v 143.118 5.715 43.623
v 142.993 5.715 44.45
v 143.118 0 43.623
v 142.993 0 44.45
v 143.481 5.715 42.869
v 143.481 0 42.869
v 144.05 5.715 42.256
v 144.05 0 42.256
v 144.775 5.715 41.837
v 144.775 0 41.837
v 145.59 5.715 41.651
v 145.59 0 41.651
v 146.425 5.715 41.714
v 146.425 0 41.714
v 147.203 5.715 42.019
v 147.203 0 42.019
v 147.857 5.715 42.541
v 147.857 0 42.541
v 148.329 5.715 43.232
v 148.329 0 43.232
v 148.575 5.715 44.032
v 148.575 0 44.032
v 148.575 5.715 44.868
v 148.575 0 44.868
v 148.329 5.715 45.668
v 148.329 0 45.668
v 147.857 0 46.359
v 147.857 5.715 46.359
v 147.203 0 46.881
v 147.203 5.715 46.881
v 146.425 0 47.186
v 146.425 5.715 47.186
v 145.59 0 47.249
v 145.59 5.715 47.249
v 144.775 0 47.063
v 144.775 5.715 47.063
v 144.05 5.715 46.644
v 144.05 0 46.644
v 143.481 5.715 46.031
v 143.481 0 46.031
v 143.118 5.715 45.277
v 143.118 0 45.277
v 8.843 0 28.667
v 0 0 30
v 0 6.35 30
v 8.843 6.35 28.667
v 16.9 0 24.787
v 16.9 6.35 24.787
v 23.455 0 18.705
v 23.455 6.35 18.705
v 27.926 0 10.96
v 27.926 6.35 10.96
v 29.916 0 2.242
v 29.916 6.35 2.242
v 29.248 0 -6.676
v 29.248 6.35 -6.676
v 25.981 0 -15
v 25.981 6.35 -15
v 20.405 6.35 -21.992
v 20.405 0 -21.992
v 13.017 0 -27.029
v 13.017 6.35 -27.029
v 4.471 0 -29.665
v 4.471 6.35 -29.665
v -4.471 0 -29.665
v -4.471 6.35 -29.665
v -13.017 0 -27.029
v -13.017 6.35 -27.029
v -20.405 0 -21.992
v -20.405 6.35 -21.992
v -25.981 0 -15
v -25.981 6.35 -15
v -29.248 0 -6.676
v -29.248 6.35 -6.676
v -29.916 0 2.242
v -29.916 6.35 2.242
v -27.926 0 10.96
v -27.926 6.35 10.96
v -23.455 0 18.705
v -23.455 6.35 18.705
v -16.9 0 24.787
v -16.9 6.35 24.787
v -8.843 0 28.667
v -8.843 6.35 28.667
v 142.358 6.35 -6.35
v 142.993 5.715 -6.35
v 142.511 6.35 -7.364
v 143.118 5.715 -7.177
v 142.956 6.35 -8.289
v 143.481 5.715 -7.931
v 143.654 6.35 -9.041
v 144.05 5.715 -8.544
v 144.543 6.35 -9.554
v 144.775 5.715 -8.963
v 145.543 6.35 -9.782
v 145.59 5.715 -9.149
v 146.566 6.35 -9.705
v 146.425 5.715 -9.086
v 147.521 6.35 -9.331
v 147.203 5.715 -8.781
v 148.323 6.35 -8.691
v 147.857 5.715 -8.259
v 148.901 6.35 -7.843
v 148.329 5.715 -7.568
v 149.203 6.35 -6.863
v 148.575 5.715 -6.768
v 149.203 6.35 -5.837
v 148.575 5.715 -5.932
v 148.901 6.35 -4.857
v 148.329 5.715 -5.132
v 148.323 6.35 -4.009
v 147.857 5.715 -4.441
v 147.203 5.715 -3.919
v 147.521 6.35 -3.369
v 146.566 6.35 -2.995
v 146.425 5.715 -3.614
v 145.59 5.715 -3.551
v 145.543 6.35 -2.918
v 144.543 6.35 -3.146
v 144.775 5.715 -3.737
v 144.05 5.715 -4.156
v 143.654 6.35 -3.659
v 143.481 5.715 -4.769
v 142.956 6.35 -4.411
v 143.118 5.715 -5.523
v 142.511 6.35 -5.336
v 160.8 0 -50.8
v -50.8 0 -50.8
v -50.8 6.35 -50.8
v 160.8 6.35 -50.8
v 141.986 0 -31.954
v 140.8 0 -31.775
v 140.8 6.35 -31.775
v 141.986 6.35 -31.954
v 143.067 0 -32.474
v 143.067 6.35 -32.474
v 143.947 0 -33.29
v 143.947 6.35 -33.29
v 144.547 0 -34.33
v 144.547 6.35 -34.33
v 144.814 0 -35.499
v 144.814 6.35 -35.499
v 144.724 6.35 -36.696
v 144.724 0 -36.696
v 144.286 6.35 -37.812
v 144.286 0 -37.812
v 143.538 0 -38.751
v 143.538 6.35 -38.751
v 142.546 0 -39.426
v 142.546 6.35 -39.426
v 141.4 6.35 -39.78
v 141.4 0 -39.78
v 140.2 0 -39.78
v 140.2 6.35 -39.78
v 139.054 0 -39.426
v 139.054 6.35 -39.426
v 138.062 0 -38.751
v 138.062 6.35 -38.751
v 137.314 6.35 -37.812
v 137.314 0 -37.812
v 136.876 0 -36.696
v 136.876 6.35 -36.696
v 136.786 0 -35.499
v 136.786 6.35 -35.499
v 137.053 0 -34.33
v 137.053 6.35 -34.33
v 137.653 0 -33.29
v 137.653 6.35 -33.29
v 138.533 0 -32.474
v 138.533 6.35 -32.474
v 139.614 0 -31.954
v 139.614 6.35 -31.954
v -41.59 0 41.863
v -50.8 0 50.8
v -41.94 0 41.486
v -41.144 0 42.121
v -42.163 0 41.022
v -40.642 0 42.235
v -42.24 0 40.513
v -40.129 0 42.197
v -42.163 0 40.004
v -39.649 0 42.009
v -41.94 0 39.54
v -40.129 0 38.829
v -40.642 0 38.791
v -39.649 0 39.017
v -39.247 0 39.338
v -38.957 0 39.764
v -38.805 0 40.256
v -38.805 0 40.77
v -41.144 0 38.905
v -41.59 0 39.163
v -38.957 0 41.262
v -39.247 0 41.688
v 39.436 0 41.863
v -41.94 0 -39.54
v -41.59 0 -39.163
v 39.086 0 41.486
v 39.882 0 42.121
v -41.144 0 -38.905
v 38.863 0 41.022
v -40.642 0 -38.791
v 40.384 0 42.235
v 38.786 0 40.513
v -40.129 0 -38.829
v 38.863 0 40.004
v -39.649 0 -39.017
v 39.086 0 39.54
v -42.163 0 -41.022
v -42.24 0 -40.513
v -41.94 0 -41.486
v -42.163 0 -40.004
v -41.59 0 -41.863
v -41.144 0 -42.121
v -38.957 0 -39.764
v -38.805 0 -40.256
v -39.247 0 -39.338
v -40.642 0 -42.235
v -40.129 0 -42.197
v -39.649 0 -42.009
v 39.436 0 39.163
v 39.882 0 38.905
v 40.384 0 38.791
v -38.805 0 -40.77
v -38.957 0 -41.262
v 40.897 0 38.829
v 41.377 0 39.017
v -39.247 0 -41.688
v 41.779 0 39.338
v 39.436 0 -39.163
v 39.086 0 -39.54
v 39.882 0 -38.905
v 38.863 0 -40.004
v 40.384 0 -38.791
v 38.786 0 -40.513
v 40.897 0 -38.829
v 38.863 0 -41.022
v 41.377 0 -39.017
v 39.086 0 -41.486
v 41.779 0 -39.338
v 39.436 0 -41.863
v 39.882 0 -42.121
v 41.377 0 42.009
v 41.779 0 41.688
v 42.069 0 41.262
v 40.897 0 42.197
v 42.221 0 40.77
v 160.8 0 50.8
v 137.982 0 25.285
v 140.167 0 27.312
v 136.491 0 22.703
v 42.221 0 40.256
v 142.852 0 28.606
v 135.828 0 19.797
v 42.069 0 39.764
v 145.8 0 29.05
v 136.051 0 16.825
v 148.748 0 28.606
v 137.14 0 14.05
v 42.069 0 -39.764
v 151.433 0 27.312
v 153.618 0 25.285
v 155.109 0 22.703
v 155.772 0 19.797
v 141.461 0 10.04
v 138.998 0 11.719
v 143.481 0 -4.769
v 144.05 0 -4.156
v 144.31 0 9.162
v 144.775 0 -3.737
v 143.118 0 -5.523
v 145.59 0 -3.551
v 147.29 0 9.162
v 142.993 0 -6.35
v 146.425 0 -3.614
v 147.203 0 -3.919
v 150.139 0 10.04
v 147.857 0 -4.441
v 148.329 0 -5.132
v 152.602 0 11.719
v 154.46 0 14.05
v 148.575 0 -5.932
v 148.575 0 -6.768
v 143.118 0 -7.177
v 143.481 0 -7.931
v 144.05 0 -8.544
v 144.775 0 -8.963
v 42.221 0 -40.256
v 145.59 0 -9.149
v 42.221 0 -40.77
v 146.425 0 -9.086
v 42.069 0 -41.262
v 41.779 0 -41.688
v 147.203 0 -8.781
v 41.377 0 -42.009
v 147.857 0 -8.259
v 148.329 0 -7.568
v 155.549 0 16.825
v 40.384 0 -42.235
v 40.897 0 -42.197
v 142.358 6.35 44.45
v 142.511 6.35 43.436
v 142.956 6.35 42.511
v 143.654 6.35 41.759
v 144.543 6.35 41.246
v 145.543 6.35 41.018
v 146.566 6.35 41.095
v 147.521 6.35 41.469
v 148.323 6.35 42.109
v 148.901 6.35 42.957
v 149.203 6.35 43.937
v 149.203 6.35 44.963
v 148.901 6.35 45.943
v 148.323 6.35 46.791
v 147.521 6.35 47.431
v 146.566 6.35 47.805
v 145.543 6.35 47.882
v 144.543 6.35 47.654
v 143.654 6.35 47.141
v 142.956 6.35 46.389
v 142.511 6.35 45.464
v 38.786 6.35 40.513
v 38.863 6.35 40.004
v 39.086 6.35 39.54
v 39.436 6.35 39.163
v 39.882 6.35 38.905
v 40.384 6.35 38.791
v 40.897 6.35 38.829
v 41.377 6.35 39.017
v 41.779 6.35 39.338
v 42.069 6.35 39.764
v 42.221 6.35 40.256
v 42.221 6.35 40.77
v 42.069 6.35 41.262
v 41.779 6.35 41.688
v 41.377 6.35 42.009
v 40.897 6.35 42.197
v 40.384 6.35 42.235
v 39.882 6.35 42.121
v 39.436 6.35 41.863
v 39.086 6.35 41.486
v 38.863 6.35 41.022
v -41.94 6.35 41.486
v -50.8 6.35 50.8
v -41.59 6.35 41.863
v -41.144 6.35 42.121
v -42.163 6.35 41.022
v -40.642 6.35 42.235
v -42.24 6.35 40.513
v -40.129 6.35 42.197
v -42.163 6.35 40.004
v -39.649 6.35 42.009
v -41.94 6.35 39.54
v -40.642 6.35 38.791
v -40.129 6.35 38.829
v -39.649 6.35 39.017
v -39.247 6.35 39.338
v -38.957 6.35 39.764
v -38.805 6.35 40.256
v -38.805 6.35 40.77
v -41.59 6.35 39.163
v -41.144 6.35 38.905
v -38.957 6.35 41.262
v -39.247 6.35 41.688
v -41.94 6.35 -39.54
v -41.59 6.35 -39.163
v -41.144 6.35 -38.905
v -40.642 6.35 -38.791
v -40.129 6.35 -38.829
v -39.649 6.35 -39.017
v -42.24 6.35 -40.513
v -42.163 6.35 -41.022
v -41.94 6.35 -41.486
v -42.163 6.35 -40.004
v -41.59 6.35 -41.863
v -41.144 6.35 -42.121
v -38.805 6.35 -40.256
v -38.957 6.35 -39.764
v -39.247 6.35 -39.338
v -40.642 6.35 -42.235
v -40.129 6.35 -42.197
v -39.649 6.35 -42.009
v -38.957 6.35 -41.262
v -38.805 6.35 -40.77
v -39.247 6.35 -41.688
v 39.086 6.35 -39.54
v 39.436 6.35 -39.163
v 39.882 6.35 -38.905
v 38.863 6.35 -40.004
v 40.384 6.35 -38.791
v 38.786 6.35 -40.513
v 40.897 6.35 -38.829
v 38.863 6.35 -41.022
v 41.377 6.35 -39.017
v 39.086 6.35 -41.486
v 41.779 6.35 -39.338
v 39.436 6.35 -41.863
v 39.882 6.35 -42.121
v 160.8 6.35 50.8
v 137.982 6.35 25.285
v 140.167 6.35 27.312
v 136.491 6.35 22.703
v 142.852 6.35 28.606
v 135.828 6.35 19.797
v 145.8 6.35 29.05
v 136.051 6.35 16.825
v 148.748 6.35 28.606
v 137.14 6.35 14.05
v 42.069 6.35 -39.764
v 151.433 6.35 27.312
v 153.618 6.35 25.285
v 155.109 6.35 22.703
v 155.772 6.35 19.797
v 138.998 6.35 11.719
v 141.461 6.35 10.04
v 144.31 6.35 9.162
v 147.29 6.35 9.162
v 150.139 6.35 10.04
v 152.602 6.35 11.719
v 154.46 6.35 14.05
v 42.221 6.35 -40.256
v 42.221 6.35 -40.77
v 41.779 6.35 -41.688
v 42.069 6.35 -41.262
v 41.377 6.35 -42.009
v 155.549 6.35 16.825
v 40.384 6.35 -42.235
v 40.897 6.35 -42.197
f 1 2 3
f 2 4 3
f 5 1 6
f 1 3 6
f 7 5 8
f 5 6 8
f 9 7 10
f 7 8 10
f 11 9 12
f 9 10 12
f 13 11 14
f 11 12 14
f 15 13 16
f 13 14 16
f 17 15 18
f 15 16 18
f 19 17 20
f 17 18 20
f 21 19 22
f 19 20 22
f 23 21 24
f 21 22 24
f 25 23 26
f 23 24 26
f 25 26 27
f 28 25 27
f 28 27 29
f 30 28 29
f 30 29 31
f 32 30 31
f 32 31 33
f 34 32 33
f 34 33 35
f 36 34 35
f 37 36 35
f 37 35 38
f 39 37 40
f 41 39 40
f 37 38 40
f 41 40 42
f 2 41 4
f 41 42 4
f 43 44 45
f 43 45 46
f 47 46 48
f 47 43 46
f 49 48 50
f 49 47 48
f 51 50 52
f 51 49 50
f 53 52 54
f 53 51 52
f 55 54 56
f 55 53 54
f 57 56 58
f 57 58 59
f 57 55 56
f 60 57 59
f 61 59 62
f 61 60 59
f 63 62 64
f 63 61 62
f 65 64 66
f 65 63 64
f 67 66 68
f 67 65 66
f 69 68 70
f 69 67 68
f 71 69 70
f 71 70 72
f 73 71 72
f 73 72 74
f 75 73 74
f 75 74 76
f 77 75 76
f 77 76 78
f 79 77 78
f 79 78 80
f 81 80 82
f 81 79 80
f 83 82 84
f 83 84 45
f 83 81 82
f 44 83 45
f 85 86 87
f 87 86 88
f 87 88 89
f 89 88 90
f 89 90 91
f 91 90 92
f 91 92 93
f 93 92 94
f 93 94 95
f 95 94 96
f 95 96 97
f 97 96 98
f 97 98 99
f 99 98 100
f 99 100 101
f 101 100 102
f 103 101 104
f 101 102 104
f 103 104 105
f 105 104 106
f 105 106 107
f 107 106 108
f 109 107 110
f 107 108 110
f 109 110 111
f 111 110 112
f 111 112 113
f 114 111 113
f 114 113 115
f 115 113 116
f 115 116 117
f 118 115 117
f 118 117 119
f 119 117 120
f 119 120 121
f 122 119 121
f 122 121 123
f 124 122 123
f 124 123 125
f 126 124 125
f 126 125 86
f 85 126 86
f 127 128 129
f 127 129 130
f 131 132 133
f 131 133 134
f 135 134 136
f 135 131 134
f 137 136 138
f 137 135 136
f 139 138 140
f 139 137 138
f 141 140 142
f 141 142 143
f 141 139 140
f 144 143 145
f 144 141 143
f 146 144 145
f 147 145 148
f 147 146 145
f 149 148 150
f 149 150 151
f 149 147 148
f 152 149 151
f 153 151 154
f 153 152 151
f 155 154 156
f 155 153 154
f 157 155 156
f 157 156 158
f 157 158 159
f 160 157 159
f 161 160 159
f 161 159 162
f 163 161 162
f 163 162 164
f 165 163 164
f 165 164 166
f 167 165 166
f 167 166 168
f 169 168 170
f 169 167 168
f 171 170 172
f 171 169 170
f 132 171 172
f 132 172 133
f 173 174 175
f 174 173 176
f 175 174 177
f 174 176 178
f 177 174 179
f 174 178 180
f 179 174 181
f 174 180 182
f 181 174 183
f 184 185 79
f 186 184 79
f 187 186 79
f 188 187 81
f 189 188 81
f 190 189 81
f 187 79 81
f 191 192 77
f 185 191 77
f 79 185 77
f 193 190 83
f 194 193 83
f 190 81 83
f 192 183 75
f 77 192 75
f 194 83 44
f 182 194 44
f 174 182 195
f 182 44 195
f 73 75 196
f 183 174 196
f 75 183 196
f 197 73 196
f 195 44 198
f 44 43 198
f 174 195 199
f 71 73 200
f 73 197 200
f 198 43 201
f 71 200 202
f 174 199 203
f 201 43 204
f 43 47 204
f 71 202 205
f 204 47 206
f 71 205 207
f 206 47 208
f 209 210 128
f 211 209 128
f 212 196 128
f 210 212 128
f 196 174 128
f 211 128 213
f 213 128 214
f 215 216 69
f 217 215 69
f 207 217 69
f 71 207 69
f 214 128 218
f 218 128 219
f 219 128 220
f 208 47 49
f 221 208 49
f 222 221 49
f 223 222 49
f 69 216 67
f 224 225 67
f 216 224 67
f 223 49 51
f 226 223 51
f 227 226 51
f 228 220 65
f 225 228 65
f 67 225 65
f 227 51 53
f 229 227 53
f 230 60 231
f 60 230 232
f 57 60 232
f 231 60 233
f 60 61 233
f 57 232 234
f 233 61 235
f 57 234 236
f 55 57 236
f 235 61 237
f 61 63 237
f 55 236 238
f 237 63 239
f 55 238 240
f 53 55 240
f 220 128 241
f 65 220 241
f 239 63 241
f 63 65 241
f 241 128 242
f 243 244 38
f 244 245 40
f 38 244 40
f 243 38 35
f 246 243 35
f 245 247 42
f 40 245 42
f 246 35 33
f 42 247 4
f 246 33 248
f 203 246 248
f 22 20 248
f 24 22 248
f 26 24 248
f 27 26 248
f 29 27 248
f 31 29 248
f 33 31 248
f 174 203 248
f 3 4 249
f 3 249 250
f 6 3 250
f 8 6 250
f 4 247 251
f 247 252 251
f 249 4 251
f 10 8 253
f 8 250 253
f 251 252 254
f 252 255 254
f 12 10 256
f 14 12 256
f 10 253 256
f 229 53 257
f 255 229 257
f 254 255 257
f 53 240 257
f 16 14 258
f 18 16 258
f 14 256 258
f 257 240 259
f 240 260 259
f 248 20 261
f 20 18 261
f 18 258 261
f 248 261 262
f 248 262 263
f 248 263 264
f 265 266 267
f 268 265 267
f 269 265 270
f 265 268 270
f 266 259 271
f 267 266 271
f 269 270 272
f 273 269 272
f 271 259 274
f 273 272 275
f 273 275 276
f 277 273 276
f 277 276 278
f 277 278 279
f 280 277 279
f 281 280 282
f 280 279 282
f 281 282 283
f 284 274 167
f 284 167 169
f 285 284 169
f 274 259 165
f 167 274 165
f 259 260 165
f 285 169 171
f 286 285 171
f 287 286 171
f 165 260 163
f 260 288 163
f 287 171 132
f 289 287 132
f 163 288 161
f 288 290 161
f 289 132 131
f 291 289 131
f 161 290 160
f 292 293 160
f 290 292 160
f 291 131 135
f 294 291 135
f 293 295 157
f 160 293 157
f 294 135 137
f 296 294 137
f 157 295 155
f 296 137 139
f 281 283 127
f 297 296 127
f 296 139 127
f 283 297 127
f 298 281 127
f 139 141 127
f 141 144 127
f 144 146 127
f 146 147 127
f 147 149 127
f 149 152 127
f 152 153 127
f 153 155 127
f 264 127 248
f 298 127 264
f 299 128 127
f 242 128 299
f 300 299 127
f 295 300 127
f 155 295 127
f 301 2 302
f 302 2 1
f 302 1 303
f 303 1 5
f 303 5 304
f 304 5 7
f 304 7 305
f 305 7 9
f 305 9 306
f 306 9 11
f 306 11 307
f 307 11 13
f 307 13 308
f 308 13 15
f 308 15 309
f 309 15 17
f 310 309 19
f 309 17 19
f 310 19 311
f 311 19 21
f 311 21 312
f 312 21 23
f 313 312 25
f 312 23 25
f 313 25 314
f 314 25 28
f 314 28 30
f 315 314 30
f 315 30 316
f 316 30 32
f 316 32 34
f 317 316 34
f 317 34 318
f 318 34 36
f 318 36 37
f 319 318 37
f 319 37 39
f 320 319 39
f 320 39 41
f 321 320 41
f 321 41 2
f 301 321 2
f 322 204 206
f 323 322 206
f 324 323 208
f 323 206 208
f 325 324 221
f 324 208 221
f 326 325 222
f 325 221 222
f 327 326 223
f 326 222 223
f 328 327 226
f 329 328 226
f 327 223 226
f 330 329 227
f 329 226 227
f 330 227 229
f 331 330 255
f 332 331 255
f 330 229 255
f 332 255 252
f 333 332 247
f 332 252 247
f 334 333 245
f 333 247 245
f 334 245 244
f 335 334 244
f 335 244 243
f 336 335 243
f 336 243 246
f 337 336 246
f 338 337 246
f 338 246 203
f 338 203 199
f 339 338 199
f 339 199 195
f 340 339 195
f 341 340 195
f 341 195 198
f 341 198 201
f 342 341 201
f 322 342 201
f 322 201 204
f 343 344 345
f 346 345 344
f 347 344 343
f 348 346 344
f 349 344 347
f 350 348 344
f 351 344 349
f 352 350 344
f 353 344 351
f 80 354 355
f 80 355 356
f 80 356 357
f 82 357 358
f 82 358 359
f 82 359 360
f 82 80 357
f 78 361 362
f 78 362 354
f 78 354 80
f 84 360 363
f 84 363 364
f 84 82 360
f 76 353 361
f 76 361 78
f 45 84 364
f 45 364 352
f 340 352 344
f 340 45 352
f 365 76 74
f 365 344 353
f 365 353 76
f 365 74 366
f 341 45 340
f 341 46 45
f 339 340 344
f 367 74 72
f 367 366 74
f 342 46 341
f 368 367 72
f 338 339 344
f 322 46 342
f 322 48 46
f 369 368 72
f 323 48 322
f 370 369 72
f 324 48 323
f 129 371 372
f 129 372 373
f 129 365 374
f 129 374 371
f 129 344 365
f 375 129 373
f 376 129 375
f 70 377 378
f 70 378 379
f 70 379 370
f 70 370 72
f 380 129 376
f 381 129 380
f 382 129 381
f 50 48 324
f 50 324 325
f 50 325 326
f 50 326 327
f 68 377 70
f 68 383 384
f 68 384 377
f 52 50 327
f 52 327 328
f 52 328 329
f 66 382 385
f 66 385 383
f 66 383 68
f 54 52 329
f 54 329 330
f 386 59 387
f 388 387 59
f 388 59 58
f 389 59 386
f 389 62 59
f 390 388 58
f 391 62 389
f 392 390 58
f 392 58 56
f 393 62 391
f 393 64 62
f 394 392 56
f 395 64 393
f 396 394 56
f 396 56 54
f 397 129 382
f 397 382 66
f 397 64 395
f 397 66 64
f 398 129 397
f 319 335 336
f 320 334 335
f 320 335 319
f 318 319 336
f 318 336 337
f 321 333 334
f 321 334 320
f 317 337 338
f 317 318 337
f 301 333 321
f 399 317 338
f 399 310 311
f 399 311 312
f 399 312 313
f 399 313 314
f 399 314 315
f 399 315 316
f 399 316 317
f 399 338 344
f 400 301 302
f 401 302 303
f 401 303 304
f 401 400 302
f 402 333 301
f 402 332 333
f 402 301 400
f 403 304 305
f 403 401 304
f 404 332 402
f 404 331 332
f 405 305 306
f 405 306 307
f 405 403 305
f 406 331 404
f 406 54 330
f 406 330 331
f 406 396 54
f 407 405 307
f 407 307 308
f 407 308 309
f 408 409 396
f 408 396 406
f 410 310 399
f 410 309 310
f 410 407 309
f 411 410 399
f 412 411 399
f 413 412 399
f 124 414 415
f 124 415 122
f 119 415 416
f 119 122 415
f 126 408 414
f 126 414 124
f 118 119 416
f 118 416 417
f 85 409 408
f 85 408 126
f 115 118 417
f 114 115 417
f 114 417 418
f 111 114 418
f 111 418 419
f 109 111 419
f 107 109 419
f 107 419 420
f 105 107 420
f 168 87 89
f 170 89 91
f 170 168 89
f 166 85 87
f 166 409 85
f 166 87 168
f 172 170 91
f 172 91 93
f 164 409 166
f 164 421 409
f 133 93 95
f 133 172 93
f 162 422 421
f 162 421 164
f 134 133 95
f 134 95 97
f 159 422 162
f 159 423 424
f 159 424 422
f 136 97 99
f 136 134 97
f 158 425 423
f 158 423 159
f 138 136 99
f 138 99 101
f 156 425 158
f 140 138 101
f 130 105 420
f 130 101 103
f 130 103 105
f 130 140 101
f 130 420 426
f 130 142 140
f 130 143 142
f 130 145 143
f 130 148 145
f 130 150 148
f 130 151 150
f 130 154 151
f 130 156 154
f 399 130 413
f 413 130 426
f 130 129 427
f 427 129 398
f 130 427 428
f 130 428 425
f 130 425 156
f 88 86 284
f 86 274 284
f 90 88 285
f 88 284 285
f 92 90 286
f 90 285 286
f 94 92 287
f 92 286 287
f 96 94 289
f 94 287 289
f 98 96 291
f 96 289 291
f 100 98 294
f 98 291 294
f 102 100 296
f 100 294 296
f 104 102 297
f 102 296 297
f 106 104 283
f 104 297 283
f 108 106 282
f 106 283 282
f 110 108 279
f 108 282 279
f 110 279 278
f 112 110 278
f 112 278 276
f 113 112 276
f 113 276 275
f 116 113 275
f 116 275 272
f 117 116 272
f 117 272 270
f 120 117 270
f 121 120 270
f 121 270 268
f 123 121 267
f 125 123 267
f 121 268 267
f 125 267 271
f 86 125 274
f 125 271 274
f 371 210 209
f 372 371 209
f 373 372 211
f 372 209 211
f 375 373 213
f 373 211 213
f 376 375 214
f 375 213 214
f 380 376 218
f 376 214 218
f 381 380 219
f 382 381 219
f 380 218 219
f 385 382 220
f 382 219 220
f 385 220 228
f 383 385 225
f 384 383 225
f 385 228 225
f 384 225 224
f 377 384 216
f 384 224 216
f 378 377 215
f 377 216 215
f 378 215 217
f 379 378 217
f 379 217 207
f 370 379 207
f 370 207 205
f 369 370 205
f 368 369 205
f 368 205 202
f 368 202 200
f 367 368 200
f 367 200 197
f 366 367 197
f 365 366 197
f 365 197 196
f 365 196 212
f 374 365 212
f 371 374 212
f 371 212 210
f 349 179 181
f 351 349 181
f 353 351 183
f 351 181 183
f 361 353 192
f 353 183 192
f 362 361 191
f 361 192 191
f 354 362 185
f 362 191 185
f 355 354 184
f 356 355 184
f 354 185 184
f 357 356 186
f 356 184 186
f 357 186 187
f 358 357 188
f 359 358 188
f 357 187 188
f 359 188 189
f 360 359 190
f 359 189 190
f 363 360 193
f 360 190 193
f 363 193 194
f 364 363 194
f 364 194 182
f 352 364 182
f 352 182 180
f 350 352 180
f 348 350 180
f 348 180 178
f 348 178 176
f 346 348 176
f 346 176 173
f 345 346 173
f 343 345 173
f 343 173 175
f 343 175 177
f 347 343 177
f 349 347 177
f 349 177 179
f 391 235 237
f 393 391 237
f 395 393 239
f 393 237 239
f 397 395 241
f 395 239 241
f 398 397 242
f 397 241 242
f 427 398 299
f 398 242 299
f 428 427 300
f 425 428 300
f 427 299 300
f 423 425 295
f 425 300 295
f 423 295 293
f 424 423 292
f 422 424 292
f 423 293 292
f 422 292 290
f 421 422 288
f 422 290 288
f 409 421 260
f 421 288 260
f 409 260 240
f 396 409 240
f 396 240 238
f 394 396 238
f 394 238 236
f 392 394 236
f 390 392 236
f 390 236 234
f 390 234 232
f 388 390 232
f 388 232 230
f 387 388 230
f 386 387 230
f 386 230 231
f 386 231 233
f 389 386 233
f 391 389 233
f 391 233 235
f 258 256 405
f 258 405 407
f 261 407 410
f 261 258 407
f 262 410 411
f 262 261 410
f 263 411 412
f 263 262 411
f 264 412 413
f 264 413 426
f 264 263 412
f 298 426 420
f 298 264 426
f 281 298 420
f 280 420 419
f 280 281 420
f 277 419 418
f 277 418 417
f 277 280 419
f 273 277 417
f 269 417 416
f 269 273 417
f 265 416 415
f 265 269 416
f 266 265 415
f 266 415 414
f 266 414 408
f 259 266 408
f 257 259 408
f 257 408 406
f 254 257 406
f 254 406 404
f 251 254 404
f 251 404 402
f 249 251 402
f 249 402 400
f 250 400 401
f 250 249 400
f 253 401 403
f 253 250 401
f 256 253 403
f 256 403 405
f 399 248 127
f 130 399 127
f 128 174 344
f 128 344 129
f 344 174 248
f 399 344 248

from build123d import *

# Parameters (mm, degrees)
SKETCH1_W                        = 211.6
SKETCH1_H                        = 101.6
SKETCH1_R                        = 30
SKETCH1_R_2                      = 4.025
SKETCH1_R_3                      = 10
BOSS_EXTRUDE1_DEPTH              = 6.35
F_8_32_TAPPED_HOLE1_D            = 3.4544
F_10_CLEARANCE_HOLE1_D           = 5.6134
F_10_CLEARANCE_HOLE1_CSINK_D     = 6.8834
F_10_CLEARANCE_HOLE1_CSINK_ANGLE = 90


with BuildPart() as part:
    # Sketch1 → Boss-Extrude1 (new body)
    with BuildSketch(Plane(origin=(0, 0, 0), x_dir=(1, 0, 0), z_dir=(0, 1, 0))):
        with Locations((55, 0)):
            Rectangle(SKETCH1_W, SKETCH1_H)
        with Locations(Location((0, 0, 0), (0, 0, 270))):
            Circle(SKETCH1_R, mode=Mode.SUBTRACT)
        with Locations(Location((140.8, 35.8, 0), (0, 0, 270))):
            Circle(SKETCH1_R_2, mode=Mode.SUBTRACT)
        with Locations(Location((145.8, -19.05, 0), (0, 0, 270))):
            Circle(SKETCH1_R_3, mode=Mode.SUBTRACT)
    extrude(amount=BOSS_EXTRUDE1_DEPTH)

    # #8-32 Tapped Hole1 (through all)
    with Locations(Plane(origin=(0, 6.35, 0), x_dir=(1, 0, 0), z_dir=(0, 1, 0))):
        with Locations((-40.513, 40.513), (40.513, 40.513), (40.513, -40.513), (-40.513, -40.513)):
            Hole(F_8_32_TAPPED_HOLE1_D / 2)

    # #10 Clearance Hole1 (through all)
    with Locations(Plane(origin=(0, 6.35, 0), x_dir=(1, 0, 0), z_dir=(0, 1, 0))):
        with Locations((145.8, 6.35), (145.8, -44.45)):
            CounterSinkHole(F_10_CLEARANCE_HOLE1_D / 2, F_10_CLEARANCE_HOLE1_CSINK_D / 2, counter_sink_angle=F_10_CLEARANCE_HOLE1_CSINK_ANGLE)


solid = part.part
